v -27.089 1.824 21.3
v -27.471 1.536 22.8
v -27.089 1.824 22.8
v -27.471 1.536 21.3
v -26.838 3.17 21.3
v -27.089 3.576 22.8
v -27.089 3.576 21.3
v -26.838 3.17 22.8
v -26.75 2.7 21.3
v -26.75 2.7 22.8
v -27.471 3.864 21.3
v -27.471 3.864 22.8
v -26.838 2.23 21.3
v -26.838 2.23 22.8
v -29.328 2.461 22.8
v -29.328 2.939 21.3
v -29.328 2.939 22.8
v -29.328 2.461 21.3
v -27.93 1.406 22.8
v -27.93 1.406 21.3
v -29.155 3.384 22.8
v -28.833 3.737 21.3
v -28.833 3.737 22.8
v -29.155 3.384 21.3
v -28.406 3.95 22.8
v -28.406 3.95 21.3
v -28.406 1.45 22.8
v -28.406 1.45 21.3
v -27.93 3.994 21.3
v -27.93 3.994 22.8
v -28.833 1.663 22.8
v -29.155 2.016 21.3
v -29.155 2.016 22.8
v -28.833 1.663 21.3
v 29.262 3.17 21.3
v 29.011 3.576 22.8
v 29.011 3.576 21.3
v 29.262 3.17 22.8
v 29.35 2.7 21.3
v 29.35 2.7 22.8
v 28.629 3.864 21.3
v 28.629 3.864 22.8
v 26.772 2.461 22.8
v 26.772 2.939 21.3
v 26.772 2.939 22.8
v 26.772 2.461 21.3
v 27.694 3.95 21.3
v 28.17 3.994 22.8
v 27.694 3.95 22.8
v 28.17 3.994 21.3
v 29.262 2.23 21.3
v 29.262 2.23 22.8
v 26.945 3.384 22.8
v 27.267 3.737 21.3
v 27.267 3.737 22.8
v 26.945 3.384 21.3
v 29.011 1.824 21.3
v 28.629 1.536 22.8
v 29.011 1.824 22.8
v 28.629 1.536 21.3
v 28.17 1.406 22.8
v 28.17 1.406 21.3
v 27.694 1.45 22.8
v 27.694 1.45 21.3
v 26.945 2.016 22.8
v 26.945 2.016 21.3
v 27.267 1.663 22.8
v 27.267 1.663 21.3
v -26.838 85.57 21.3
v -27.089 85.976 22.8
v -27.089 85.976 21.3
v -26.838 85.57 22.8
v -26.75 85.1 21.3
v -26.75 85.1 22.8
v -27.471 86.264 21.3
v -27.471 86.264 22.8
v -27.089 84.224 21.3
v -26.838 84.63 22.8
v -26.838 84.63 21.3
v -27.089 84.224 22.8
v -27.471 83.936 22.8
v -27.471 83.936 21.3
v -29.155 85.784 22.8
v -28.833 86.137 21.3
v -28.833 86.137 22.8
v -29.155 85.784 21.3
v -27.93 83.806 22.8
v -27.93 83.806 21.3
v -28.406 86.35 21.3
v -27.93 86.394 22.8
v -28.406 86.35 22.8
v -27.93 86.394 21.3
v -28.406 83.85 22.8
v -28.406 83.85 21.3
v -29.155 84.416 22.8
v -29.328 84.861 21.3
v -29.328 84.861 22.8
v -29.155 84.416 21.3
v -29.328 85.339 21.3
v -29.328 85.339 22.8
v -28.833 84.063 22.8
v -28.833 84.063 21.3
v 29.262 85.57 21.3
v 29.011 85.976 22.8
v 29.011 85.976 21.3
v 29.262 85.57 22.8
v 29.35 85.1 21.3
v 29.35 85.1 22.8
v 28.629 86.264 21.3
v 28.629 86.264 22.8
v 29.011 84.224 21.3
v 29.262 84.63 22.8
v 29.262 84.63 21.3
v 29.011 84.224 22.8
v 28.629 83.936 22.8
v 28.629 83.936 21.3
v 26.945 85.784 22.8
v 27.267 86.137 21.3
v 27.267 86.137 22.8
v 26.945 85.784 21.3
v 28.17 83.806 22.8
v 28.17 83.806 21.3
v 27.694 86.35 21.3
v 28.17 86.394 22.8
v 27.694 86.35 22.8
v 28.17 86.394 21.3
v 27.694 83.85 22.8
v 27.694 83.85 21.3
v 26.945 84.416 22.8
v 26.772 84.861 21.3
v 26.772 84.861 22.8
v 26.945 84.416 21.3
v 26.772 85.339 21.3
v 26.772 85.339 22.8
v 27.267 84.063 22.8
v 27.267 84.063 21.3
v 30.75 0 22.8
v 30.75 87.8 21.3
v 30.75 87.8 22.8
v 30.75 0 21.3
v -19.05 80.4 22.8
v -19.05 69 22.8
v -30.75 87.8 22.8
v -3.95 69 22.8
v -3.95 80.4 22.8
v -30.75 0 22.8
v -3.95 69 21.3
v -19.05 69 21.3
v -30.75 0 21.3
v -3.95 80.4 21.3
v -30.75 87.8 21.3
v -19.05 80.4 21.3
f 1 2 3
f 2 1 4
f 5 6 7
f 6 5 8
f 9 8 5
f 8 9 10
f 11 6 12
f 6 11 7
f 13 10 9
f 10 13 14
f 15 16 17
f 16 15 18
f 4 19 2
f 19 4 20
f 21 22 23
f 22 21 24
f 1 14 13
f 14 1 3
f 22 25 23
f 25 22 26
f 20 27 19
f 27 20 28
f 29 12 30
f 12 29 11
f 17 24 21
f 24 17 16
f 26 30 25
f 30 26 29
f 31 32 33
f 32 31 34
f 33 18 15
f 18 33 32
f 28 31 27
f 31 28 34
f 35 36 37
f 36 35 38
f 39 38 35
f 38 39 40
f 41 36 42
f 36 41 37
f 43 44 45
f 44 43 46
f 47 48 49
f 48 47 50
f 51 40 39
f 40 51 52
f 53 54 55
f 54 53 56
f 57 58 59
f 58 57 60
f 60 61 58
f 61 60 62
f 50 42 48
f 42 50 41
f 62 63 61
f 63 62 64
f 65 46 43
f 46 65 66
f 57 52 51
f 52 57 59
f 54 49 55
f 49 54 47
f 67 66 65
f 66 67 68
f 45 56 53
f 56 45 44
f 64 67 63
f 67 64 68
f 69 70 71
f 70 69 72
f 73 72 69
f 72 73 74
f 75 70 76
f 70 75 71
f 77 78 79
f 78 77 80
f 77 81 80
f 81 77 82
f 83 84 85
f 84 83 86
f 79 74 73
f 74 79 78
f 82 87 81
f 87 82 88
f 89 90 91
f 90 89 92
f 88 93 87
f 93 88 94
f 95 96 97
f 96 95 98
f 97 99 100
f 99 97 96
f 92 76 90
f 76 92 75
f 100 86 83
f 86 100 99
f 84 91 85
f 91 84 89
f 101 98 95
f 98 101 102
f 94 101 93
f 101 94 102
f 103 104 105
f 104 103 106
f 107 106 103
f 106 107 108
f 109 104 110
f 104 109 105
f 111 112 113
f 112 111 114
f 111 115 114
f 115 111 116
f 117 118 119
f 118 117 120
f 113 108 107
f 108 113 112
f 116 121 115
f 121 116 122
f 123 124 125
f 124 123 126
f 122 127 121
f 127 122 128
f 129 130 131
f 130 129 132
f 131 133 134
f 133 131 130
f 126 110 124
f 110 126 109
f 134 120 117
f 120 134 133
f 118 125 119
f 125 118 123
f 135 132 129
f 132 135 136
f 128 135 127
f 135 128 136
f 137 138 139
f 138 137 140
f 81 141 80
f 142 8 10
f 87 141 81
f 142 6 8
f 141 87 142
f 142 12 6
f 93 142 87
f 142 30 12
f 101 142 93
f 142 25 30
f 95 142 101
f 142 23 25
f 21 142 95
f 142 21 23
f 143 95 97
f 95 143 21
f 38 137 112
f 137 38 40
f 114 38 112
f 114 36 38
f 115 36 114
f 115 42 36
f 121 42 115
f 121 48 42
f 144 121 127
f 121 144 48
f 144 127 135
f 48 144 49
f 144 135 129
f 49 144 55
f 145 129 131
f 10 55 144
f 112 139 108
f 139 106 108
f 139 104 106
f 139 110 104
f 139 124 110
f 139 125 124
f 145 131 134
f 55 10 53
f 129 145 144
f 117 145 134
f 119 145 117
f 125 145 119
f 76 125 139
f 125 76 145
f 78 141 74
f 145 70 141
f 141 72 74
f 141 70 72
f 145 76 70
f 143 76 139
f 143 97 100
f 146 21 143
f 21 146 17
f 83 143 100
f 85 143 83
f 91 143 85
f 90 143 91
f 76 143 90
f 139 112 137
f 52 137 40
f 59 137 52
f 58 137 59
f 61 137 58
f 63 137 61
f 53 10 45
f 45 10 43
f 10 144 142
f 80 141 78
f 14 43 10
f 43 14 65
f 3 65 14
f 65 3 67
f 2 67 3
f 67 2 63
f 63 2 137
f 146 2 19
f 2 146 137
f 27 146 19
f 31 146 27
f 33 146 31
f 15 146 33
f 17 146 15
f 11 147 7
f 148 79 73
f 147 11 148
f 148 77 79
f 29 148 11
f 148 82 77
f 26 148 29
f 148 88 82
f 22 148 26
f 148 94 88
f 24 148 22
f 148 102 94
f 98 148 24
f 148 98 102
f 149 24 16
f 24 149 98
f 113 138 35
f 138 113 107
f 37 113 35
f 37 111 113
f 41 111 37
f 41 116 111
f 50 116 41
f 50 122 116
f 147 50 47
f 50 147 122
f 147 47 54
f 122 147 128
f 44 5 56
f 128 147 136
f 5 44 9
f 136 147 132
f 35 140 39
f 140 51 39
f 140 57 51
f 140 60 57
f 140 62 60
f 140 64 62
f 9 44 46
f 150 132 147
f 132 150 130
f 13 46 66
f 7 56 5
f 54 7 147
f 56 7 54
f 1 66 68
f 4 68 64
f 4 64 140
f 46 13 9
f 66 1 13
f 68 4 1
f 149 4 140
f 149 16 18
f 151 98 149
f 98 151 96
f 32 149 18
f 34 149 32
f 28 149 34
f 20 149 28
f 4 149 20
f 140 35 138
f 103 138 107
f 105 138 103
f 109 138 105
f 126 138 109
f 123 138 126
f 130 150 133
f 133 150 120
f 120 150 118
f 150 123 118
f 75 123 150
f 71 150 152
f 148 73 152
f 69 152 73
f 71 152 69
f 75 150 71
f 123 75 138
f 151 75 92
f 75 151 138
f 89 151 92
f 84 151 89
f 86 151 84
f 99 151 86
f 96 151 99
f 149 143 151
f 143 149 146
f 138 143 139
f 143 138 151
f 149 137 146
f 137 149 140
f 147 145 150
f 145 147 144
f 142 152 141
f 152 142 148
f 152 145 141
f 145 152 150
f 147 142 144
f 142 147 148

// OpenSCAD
$fa = 1;
$fs = 0.5;

wall_thickness = 2;
lid_thickness = 2;
fit_tolerance = 0.5;

board_pcb_thickness = 1.55;
probe_conn_height=19.0;

board_length = 87.8; // length including terminal connections
board_width = 51.2;
board_height = board_pcb_thickness+probe_conn_height; // height including tallest component
board_clearance_h = 5;
board_clearance_w = 15;

board_pcb_length=81.5;

probe_conn_width=15.2;

probe_conn_length=19.8;
probe_conn_offset_y=34;
probe_conn_offset_x=9.5;

probe_negative_pin_w=3.0;
probe_positive_pin_w=2.5;
probe_pin_height=1.0;
probe_pin_length=12.5;
probe_pin_gap=5.2;
probe_pin_offset_y=probe_pin_length-wall_thickness-fit_tolerance;
probe_pin_offset_x=-0.5;
probe_pin_offset_z=3.8; // from bottom of probe connector

ssr_conn_width=8.5;
ssr_conn_height=12.0;
ssr_conn_length=11.6;
ssr_conn_offset_y=30.8;
ssr_conn_offset_x=-8.5;

ssr_plug_width=15.1;
ssr_plug_height=8.9;
ssr_plug_length=11.4;
ssr_plug_offset_x=-3; // TODO: measure

micro_height=16.9;
micro_length=50.2;
micro_width=20.8;
micro_offset_y=-15.6;


pcb_mount_screw_offset = 34;
lid_screw_offset = 4.7; 

usb_offset_h = 16; // relative to the bottom edge of the PCB board
usb_offset_w = 0; // relative to the centre of the PCB board
usb_width = 12;
usb_height = 6;

front_screw_offset_h= usb_offset_h - 11;
front_screw_offset_w=0;
front_screw_gap=45;

screw1 = 2.6;
screw1_length=10;
nut1_width=5.5;
nut1_depth=1.7;

mount_width=nut1_width + fit_tolerance + 2.0;
mount_height=mount_width-0.65 - fit_tolerance;
mount_length=screw1_length+2;

// make overall outside dimension enclose pcb assembly
height = board_height + board_clearance_h 
        + wall_thickness + lid_thickness + fit_tolerance;
width = 67.5 - fit_tolerance*2;
length = board_length + wall_thickness*2 + fit_tolerance*2;

module pcb_board() {
    // pcb board
    color("white")
        translate([0,-(board_length - board_pcb_length)/2,board_pcb_thickness/2])
       cube([board_width,board_pcb_length,board_pcb_thickness],true);
}

module micro_board() {
     // micro proccesor daughter board
    color("cornflowerblue")
        translate([0,micro_offset_y,micro_height/2+board_pcb_thickness])
            cube([micro_width,micro_length,micro_height],true);
}

module probe_conn() {
    color("yellow")
        translate([ probe_conn_offset_x,
                    probe_conn_offset_y,
                    probe_conn_height/2+board_pcb_thickness ])
        cube([probe_conn_width,probe_conn_length,probe_conn_height],true);
}

module probe_socket_pins() {

    socket_width=probe_positive_pin_w+probe_negative_pin_w+probe_pin_gap;
    translate([0,-probe_pin_offset_y,board_pcb_thickness/2])
    translate([ probe_pin_offset_x + probe_conn_offset_x - probe_conn_width/2 + socket_width/2 ,
                    probe_conn_offset_y + probe_conn_length/2 + probe_pin_length/2,
                    probe_pin_offset_z+board_pcb_thickness ])
        union() {
            color("red")
                cube([probe_positive_pin_w + fit_tolerance,probe_pin_length,probe_pin_height + fit_tolerance],true);
            translate([probe_pin_gap,0,0]) color("black")
                cube([probe_negative_pin_w+ fit_tolerance,probe_pin_length,probe_pin_height+ fit_tolerance],true);
        }
}

module ssr_conn() {
    color("green")
        translate([ ssr_conn_offset_x,
                    ssr_conn_offset_y,
                    ssr_conn_height/2+board_pcb_thickness])
            cube([ssr_conn_width,ssr_conn_length,ssr_conn_height],true);
}

module ssr_plug() {
    translate([ ssr_conn_offset_x+ssr_plug_offset_x,
                ssr_conn_offset_y,
                ssr_plug_height/2+ssr_conn_height+board_pcb_thickness ])
        union() {
            cable_angle=90;
            color("green")
                cube([ssr_plug_width,ssr_plug_length,ssr_plug_height],true);
            color("red")
                translate([0,-2,0]) rotate([0,-90 + cable_angle,0]) cylinder(100,r=1.4/2);
            color("black")
                translate([0,2,0]) rotate([0,-90 + cable_angle,0]) cylinder(100,r=1.4/2);
            color([0,0,0,0.2])
                rotate([0,-90+cable_angle,0]) translate([0,0,48]) cube([4,6,90],true);
            
        }
}

module pcb_board_assembly() {
    translate([0,board_length/2,0])
    union() {
        translate([0,0,board_height/2])
        *cube([board_width,board_length,board_height],true);
        
        pcb_board();
        micro_board();
        probe_conn();
        ssr_conn();
        ssr_plug();
        probe_socket_pins();
    }
}

module offset_from_corners( offset, w, l ) {
    union() {
        translate([-w/2+offset,-l/2+offset,0]) 
            children();
        
        translate([w/2-offset,-l/2+offset,0]) 
            children();
        
        translate([-w/2+offset,l/2-offset,0]) 
            children();
        
        translate([w/2-offset,l/2-offset,0])
            children();
    }
}

module screw_hole(h,d) {
    difference() {
        cylinder(h,r=d);
        cylinder(h,r=d/2);
    }
}

module usb_connector() {
    translate([ 0,-wall_thickness/2-fit_tolerance,usb_offset_h ])
        cube([usb_width,wall_thickness,usb_height],true);
}

module front_mount_screws() {
   
    union() {
        translate([ -front_screw_gap/2 + screw1/2 + front_screw_offset_w,
                    -fit_tolerance, front_screw_offset_h ]) {
            rotate([90,0,0])
                cylinder(screw1_length,r=screw1/2);
        }
        
        translate([ front_screw_gap/2 - screw1/2 + front_screw_offset_w,
                    -fit_tolerance, front_screw_offset_h ]) {
            rotate([90,0,0])
                cylinder(screw1_length,r=screw1/2);
        }
    }
}

module front_mount_hut_holder() {
    difference() {
        cube([mount_width,mount_length,mount_height],true);
        cube([nut1_width+fit_tolerance,nut1_depth+fit_tolerance,mount_height],true);
        translate([0,2.5,-mount_height/2]) rotate([12,0,0]) translate([0,0,-1]) 
            cube([mount_width*2,mount_length*2,4],true);
    }
}

module front_mount_nut_holders() {
    translate([0,mount_length/2-wall_thickness,0])
        difference() {
            union() {
                    translate([ -front_screw_gap/2 + screw1/2 + front_screw_offset_w,
                                -fit_tolerance, front_screw_offset_h ]) 
                        front_mount_hut_holder();
                    
                    translate([ front_screw_gap/2 - screw1/2 + front_screw_offset_w,
                                -fit_tolerance, front_screw_offset_h ]) 
                        front_mount_hut_holder();
                }
            front_mount_screws();
        }
}



module body() {
    union() {
        difference() {
            translate([0,length/2-wall_thickness-fit_tolerance,
                       height/2 - wall_thickness - board_clearance_h]) 
                difference() {
                    cube([width,length,height],true);
                    translate([0,0,wall_thickness])
                        cube( [ width-wall_thickness*2,
                                length-wall_thickness*2,
                                height],true);    
                }
        
            usb_connector();
            front_mount_screws();
            translate([0,board_length/2+2,0]) // offset by 2 to ensure holes are cut
                probe_socket_pins();
        }
        front_mount_nut_holders();
        pcb_mounts();
        lid_screws();
    }
}

module pcb_mounts() {
    translate([0,pcb_mount_screw_offset + board_length/2,
        -board_clearance_h])
            screw_hole(board_clearance_h,screw1);
    support_thickness=2;
    translate([0,support_thickness/2,
        -board_clearance_h/2])
            cube([width,support_thickness,board_clearance_h],true);
}

module lid_screws() {
    screw_height = height - wall_thickness - lid_thickness;
    translate([0,board_length/2,-board_clearance_h])
        offset_from_corners(lid_screw_offset,width,length)
            screw_hole(screw_height,screw1);
}

module lid(explode) {
    hole_offset = lid_screw_offset-wall_thickness;
    lid_width = width-wall_thickness*2-fit_tolerance*2;
    lid_length = length-wall_thickness*2-fit_tolerance*2;
    
    translate([0,0,explode]) 
        difference() {
            translate([0,lid_length/2,board_height+lid_thickness/2 + fit_tolerance]) {
                            
                difference() {
                    cube([ lid_width,
                           lid_length,
                           lid_thickness-fit_tolerance ],true);
                    
                    offset_from_corners(hole_offset,lid_width,lid_length)
                        translate([0,0,-lid_thickness/2])
                        cylinder(lid_thickness,r=screw1/2);
                }
            }
            translate([0,board_length/2,2]) // offset by 2 to ensure holes are cut
                ssr_plug();
        }
}

union() {
    *pcb_board_assembly();
    *body();
    
    lid(0);
}
